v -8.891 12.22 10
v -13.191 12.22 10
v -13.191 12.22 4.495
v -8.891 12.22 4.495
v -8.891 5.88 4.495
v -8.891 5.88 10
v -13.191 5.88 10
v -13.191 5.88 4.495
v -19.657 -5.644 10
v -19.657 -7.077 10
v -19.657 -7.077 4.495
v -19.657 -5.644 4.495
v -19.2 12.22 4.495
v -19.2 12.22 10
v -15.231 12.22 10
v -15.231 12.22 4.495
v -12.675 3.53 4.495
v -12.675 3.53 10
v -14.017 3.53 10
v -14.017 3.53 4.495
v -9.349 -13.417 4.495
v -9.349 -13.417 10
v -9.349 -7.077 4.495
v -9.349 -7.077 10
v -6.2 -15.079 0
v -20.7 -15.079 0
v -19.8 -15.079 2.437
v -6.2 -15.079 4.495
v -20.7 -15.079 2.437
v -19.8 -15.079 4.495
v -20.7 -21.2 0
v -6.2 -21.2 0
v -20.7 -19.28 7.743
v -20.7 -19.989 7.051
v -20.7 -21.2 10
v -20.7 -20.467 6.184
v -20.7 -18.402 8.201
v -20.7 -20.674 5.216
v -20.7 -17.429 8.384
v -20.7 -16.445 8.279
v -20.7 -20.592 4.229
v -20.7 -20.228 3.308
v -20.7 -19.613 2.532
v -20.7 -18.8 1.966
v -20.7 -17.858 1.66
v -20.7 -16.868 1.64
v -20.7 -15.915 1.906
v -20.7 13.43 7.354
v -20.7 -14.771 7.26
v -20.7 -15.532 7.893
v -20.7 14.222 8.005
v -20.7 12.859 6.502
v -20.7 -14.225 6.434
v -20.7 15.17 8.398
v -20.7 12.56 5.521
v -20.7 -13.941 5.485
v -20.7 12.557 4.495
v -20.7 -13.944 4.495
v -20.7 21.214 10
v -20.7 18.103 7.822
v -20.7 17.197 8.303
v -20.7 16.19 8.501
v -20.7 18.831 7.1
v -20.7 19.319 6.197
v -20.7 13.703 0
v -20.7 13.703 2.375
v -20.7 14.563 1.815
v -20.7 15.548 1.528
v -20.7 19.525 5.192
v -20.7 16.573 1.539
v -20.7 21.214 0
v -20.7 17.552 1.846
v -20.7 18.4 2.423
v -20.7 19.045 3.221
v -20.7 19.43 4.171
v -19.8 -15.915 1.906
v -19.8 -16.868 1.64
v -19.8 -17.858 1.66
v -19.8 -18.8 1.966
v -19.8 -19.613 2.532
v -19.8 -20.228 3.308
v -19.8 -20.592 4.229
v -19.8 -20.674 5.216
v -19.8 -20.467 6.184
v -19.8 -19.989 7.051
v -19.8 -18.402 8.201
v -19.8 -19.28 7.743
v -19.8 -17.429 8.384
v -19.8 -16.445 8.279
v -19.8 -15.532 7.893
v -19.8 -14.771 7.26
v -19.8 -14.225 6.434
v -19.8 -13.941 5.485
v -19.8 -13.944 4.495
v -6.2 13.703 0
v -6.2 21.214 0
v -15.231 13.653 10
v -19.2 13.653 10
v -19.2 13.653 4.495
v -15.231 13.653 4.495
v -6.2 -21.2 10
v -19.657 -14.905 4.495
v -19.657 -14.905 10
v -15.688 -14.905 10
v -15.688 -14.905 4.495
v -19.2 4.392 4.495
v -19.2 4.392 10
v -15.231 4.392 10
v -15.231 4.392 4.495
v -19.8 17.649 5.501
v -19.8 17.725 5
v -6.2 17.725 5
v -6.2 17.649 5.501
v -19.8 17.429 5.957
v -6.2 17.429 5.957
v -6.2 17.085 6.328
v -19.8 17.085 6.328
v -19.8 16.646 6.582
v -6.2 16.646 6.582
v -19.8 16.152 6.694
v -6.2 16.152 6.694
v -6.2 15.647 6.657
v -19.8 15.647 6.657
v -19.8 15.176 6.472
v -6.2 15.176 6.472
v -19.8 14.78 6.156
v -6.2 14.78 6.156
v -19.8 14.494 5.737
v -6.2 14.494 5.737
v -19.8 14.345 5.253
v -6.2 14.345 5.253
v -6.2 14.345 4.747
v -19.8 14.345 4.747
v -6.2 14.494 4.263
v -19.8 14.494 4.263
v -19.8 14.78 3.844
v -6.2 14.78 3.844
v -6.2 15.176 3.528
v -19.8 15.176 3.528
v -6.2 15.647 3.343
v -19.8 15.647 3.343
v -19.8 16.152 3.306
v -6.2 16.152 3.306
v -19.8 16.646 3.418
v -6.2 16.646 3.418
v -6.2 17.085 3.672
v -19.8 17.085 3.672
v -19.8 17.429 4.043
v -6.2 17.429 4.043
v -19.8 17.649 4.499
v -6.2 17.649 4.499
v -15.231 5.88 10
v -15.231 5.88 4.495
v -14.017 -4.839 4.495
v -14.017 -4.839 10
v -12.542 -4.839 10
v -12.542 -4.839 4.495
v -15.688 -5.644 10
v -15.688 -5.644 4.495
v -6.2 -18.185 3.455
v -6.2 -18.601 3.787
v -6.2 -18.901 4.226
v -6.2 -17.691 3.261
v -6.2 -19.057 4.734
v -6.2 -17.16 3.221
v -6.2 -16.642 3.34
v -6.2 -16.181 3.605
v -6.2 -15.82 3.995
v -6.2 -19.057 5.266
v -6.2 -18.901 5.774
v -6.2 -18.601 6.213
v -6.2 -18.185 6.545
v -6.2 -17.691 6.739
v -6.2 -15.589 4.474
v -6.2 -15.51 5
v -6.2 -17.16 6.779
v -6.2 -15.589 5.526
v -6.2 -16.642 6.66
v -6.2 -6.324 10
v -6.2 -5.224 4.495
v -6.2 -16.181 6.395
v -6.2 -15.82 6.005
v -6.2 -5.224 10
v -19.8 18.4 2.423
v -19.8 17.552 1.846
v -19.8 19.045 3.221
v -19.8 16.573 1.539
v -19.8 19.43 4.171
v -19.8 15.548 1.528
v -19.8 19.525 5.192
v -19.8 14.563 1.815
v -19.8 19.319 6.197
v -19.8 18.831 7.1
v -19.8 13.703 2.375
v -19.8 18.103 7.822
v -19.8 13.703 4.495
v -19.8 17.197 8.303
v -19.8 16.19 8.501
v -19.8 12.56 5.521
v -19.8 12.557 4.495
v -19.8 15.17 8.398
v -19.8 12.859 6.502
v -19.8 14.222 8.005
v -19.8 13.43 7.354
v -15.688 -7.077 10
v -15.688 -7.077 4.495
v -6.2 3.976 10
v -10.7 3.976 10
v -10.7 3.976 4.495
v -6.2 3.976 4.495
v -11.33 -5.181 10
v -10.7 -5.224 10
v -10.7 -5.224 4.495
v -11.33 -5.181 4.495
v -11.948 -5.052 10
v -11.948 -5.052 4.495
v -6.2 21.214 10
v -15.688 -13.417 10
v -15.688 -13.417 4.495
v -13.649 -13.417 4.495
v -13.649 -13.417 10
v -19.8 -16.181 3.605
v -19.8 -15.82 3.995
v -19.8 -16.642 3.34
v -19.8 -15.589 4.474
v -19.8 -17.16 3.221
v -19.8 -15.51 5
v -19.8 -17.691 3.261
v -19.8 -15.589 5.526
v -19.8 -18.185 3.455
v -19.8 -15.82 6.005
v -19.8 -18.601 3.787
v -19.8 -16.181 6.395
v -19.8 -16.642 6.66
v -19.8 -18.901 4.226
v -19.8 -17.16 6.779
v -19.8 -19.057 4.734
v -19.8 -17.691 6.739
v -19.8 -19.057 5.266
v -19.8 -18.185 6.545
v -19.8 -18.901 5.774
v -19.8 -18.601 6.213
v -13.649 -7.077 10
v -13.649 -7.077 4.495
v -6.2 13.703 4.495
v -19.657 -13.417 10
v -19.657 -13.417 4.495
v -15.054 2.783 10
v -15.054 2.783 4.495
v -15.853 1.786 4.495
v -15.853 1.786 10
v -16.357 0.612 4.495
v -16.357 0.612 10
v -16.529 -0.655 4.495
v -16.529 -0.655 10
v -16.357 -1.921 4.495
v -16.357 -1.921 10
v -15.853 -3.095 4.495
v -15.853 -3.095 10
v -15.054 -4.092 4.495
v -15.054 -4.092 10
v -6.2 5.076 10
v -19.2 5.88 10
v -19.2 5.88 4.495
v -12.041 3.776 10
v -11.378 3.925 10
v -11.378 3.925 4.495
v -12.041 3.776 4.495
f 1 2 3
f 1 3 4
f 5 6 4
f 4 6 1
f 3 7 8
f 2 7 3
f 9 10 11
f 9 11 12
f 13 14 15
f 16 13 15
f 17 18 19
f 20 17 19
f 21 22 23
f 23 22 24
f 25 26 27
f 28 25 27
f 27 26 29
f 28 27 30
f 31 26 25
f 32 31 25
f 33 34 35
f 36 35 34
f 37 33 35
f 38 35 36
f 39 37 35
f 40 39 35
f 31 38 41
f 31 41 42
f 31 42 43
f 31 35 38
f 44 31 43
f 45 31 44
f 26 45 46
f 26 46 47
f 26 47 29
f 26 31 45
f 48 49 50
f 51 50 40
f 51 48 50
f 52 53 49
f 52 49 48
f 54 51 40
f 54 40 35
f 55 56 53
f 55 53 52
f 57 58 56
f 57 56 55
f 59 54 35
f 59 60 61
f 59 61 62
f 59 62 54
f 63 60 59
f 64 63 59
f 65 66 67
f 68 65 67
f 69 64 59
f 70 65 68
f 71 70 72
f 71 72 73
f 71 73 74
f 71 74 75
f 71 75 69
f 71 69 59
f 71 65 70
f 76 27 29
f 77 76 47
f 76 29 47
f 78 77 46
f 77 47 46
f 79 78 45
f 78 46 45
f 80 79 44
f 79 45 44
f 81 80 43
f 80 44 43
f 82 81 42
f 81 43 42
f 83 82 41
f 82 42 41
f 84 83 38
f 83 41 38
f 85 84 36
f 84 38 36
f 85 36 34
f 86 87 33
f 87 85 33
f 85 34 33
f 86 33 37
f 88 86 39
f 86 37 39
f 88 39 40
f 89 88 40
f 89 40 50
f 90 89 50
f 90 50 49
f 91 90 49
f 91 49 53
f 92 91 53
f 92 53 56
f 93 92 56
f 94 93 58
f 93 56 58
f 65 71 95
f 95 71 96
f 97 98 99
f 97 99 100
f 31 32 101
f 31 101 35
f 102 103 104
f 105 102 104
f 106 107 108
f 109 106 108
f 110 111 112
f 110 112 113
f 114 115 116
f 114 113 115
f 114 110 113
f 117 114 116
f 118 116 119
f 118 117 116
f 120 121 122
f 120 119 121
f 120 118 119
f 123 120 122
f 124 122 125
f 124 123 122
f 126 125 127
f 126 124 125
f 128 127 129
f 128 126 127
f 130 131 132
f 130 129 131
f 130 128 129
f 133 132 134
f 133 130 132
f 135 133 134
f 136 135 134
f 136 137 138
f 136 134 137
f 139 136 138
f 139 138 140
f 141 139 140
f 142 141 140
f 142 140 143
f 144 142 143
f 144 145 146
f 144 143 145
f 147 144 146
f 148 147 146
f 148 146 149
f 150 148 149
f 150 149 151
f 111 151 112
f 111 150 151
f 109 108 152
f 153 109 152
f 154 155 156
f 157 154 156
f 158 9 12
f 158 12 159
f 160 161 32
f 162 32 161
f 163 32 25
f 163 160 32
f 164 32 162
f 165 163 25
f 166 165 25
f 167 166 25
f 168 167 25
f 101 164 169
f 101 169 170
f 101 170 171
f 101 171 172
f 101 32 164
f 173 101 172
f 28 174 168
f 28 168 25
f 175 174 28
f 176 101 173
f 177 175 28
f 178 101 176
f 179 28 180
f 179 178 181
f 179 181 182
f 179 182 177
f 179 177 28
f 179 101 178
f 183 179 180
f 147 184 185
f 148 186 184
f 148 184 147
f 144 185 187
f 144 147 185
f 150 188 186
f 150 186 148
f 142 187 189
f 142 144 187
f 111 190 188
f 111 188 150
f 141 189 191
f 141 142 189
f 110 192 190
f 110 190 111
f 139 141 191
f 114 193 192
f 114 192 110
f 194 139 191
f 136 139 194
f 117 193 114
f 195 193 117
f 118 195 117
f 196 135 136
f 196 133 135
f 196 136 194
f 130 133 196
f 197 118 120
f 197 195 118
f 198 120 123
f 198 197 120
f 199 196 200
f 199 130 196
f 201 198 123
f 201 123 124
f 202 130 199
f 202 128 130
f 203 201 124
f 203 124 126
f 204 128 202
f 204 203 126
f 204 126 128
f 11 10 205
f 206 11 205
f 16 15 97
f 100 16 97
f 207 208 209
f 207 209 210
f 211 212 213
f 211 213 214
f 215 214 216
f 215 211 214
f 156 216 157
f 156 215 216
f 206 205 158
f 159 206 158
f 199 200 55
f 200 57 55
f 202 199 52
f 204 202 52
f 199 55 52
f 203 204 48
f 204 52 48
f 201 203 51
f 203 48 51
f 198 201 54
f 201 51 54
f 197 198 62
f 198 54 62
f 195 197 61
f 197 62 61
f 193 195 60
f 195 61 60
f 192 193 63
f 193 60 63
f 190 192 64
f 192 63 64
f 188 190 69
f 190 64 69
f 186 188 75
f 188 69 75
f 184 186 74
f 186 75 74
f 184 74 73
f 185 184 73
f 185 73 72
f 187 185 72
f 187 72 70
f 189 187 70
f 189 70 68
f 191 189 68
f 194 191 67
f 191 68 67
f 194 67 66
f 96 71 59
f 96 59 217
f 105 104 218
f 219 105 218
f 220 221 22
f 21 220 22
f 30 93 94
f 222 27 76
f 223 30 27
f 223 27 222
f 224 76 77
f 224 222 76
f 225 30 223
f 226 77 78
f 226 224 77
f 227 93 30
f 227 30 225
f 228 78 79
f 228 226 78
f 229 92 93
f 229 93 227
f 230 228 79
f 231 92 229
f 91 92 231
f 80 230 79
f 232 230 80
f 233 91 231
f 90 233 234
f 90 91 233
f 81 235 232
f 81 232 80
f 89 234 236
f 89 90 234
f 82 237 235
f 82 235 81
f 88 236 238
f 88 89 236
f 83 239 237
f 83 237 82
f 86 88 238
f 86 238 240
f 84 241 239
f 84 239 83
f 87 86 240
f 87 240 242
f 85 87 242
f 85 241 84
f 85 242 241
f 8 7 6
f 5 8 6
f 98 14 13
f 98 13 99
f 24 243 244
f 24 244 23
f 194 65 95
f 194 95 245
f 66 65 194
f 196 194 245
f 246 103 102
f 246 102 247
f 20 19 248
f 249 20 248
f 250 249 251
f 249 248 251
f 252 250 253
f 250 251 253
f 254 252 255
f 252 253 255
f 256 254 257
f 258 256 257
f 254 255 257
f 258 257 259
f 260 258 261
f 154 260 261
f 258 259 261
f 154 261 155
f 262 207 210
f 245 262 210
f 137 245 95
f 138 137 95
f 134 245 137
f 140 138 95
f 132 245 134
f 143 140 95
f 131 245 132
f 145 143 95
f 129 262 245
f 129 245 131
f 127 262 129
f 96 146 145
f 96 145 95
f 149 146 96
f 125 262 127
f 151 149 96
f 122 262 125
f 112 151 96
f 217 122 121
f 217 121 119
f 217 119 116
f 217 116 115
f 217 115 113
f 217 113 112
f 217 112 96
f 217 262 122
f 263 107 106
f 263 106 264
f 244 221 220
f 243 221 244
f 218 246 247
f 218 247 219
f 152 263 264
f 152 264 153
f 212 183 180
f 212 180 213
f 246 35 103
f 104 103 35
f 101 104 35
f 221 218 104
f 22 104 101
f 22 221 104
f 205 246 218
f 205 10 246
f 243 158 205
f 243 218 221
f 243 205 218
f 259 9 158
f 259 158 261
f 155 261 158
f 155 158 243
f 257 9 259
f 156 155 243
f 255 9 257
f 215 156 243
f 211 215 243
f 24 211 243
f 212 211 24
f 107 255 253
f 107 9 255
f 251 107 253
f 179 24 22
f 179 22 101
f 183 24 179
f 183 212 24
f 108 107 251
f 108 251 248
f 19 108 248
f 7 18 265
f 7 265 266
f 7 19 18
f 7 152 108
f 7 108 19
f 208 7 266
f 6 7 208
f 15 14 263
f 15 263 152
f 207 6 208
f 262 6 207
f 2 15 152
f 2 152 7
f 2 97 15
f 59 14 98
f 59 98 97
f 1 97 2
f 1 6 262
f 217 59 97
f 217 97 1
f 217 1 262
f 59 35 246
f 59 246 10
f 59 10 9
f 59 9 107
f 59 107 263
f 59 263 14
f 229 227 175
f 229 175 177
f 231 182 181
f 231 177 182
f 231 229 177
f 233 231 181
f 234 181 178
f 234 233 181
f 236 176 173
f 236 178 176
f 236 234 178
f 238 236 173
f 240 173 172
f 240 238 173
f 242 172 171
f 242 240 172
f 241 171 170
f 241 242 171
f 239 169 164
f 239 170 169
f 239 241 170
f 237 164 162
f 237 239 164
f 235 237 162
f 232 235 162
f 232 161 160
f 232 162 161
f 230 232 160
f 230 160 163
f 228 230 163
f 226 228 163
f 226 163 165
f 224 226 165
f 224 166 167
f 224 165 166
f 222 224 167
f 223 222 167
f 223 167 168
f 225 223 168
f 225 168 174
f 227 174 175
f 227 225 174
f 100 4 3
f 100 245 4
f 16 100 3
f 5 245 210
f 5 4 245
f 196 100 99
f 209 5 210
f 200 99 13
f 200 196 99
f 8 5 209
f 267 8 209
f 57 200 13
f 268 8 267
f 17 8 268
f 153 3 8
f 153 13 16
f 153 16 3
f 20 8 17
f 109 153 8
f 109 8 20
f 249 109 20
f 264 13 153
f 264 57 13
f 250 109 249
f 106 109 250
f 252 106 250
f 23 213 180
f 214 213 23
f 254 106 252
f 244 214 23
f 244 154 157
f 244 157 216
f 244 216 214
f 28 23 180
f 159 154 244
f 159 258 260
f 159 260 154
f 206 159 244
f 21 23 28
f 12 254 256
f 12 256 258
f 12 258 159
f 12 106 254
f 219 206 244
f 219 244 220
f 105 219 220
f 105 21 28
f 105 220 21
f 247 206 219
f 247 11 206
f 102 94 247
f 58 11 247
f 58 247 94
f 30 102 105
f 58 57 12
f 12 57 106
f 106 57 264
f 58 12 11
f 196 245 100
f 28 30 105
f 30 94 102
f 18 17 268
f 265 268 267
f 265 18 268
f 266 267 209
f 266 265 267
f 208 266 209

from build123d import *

# Parameters (mm, degrees)
F0_R      = 1.75
F1_DEPTH  = 10
F2_R      = 1.7838032989
F2_R_2    = 1.6991644828
F3_DEPTH  = 25
F5_W      = 23.6940248869
F5_H      = 47.8357747197
F6_DEPTH  = 25
F7_R      = 1.75
F8_DEPTH  = 10
F9_W      = 4.2999079451
F9_H      = 6.339606829
F9_W_2    = 3.9691450074
F9_H_2    = 1.433301717
F9_H_3    = 1.4884294942
F10_DEPTH = 25
F12_DEPTH = 10
F13_W     = 28.7822000682
F13_H     = 4.495148547
F14_DEPTH = 25
F16_DEPTH = 25
F17_R     = 3.5044645389
F17_R_2   = 3.3871652345
F18_DEPTH = 0.9


with BuildPart() as f1:
    # F0 (on Top) → F1 (new body)
    with BuildSketch(Plane.XY):
        with BuildLine():
            Line((8.2999998219, -21.1999956518), (8.2999998219, 21.2139172642))
            Line((8.2999998219, 21.2139172642), (-6.2000001781, 21.2139172642))
            Line((-6.2000001781, 21.2139172642), (-6.2000001781, 5.0756316632))
            Line((-6.2000001781, 5.0756316632), (-1.7000001781, 5.0756316632))
            ThreePointArc((-1.7000001781, 5.0756316632), (3.9999996856, -0.6243682004), (-1.7000001781, -6.3243680641))
            Line((-1.7000001781, -6.3243680641), (-6.2000001781, -6.3243680641))
            Line((-6.2000001781, -6.3243680641), (-6.2000001781, -21.1999956518))
            Line((-6.2000001781, -21.1999956518), (8.2999998219, -21.1999956518))
        make_face()
        with Locations((5.3999998219, -9.2503995063)):
            Circle(F0_R, mode=Mode.SUBTRACT)
    extrude(amount=F1_DEPTH)

    # F2 (on face) → F3 (cut)
    with BuildSketch(Plane.YZ.offset(8.2999998219)):
        with Locations((-17.2935956518, 5)):
            Circle(F2_R)
        with Locations((16.0253872642, 5)):
            Circle(F2_R_2)
    extrude(amount=-F3_DEPTH, mode=Mode.SUBTRACT)

    # F4: F1 across face


with BuildPart() as f1_1:
    add(f1.part)
    add(f1.part.mirror(Plane(origin=(-6.2000001781, 12.9732327122, 5), x_dir=(0, -1, 0), z_dir=(-1, 0, 0))))

    # F5 (on face) → F6 (cut)
    with BuildSketch(Plane.XY.offset(10)):
        with Locations((5.6470122654, 2.717891708)):
            Rectangle(F5_W, F5_H)
    extrude(amount=-F6_DEPTH, mode=Mode.SUBTRACT)

    # F7 (on face) → F8 (join, through all)
    with BuildSketch(Plane.XY.offset(10)):
        with Locations((-17.8000001781, -9.2503995063)):
            Circle(F7_R)
    extrude(amount=-F8_DEPTH)

    # F9 (on face) → F10 (cut)
    with BuildSketch(Plane.XY.offset(10)):
        with Locations((-11.4986333065, -10.246865917)):
            Rectangle(F9_W, F9_H)
        with Locations((-17.6728586666, -6.360411644)):
            Rectangle(F9_W_2, F9_H_2)
        with Locations((-17.6728586666, -14.1608840786)):
            Rectangle(F9_W_2, F9_H_3)
        with Locations((-11.0412049107, 9.0499585494)):
            Rectangle(F9_W, F9_H)
        with Locations((-17.2154302709, 12.9364128225)):
            Rectangle(F9_W_2, F9_H_2)
        with Locations((-17.2154302709, 5.1359403878)):
            Rectangle(F9_W_2, F9_H_3)
    extrude(amount=-F10_DEPTH, mode=Mode.SUBTRACT)

    # F11 (on face) → F12 (join, through all)
    with BuildSketch(Plane.XY.offset(10)):
        with BuildLine():
            Line((-10.7000001781, 3.9756317079), (-6.2000001781, 3.9756317079))
            Line((-6.2000001781, 3.9756317079), (-6.2000001781, 5.0756316632))
            Line((-6.2000001781, 5.0756316632), (-10.7000001781, 5.0756316632))
            ThreePointArc((-10.7000001781, 5.0756316632), (-16.4000000417, -0.6243682004), (-10.7000001781, -6.3243680641))
            Line((-10.7000001781, -6.3243680641), (-6.2000001781, -6.3243680641))
            Line((-6.2000001781, -6.3243680641), (-6.2000001781, -5.2243681088))
            Line((-6.2000001781, -5.2243681088), (-10.7000001781, -5.2243681088))
            ThreePointArc((-10.7000001781, -5.2243681088), (-15.3000000864, -0.6243682004), (-10.7000001781, 3.9756317079))
        make_face()
    extrude(amount=-F12_DEPTH)

    # F13 (on face) → F14 (cut)
    with BuildSketch(Plane(origin=(-20.7000001781, 0, 0), x_dir=(0, -1, 0), z_dir=(-1, 0, 0))):
        with Locations((0.6876317784, 2.2475742735)):
            Rectangle(F13_W, F13_H)
    extrude(amount=-F14_DEPTH, mode=Mode.SUBTRACT)

    # F15 (on face) → F16 (cut)
    with BuildSketch(Plane.XY.offset(10)):
        with BuildLine():
            Line((-14.0170669183, -4.8394002952), (-10.3995706886, -4.8394002952))
            Line((-10.3995706886, -4.8394002952), (-10.3995706886, 3.5300727468))
            Line((-10.3995706886, 3.5300727468), (-14.0170669183, 3.5300727468))
            ThreePointArc((-14.0170669183, 3.5300727468), (-16.5291727201, -0.6546637742), (-14.0170669183, -4.8394002952))
        make_face()
    extrude(amount=-F16_DEPTH, mode=Mode.SUBTRACT)

    # F17 (on face) → F18 (cut)
    with BuildSketch(Plane(origin=(-20.7000001781, 0, 0), x_dir=(0, -1, 0), z_dir=(-1, 0, 0))):
        with Locations((-16.0253872642, 5)):
            Circle(F17_R)
        with Locations((17.2935956518, 5)):
            Circle(F17_R_2)
    extrude(amount=-F18_DEPTH, mode=Mode.SUBTRACT)


solid = f1_1.part
